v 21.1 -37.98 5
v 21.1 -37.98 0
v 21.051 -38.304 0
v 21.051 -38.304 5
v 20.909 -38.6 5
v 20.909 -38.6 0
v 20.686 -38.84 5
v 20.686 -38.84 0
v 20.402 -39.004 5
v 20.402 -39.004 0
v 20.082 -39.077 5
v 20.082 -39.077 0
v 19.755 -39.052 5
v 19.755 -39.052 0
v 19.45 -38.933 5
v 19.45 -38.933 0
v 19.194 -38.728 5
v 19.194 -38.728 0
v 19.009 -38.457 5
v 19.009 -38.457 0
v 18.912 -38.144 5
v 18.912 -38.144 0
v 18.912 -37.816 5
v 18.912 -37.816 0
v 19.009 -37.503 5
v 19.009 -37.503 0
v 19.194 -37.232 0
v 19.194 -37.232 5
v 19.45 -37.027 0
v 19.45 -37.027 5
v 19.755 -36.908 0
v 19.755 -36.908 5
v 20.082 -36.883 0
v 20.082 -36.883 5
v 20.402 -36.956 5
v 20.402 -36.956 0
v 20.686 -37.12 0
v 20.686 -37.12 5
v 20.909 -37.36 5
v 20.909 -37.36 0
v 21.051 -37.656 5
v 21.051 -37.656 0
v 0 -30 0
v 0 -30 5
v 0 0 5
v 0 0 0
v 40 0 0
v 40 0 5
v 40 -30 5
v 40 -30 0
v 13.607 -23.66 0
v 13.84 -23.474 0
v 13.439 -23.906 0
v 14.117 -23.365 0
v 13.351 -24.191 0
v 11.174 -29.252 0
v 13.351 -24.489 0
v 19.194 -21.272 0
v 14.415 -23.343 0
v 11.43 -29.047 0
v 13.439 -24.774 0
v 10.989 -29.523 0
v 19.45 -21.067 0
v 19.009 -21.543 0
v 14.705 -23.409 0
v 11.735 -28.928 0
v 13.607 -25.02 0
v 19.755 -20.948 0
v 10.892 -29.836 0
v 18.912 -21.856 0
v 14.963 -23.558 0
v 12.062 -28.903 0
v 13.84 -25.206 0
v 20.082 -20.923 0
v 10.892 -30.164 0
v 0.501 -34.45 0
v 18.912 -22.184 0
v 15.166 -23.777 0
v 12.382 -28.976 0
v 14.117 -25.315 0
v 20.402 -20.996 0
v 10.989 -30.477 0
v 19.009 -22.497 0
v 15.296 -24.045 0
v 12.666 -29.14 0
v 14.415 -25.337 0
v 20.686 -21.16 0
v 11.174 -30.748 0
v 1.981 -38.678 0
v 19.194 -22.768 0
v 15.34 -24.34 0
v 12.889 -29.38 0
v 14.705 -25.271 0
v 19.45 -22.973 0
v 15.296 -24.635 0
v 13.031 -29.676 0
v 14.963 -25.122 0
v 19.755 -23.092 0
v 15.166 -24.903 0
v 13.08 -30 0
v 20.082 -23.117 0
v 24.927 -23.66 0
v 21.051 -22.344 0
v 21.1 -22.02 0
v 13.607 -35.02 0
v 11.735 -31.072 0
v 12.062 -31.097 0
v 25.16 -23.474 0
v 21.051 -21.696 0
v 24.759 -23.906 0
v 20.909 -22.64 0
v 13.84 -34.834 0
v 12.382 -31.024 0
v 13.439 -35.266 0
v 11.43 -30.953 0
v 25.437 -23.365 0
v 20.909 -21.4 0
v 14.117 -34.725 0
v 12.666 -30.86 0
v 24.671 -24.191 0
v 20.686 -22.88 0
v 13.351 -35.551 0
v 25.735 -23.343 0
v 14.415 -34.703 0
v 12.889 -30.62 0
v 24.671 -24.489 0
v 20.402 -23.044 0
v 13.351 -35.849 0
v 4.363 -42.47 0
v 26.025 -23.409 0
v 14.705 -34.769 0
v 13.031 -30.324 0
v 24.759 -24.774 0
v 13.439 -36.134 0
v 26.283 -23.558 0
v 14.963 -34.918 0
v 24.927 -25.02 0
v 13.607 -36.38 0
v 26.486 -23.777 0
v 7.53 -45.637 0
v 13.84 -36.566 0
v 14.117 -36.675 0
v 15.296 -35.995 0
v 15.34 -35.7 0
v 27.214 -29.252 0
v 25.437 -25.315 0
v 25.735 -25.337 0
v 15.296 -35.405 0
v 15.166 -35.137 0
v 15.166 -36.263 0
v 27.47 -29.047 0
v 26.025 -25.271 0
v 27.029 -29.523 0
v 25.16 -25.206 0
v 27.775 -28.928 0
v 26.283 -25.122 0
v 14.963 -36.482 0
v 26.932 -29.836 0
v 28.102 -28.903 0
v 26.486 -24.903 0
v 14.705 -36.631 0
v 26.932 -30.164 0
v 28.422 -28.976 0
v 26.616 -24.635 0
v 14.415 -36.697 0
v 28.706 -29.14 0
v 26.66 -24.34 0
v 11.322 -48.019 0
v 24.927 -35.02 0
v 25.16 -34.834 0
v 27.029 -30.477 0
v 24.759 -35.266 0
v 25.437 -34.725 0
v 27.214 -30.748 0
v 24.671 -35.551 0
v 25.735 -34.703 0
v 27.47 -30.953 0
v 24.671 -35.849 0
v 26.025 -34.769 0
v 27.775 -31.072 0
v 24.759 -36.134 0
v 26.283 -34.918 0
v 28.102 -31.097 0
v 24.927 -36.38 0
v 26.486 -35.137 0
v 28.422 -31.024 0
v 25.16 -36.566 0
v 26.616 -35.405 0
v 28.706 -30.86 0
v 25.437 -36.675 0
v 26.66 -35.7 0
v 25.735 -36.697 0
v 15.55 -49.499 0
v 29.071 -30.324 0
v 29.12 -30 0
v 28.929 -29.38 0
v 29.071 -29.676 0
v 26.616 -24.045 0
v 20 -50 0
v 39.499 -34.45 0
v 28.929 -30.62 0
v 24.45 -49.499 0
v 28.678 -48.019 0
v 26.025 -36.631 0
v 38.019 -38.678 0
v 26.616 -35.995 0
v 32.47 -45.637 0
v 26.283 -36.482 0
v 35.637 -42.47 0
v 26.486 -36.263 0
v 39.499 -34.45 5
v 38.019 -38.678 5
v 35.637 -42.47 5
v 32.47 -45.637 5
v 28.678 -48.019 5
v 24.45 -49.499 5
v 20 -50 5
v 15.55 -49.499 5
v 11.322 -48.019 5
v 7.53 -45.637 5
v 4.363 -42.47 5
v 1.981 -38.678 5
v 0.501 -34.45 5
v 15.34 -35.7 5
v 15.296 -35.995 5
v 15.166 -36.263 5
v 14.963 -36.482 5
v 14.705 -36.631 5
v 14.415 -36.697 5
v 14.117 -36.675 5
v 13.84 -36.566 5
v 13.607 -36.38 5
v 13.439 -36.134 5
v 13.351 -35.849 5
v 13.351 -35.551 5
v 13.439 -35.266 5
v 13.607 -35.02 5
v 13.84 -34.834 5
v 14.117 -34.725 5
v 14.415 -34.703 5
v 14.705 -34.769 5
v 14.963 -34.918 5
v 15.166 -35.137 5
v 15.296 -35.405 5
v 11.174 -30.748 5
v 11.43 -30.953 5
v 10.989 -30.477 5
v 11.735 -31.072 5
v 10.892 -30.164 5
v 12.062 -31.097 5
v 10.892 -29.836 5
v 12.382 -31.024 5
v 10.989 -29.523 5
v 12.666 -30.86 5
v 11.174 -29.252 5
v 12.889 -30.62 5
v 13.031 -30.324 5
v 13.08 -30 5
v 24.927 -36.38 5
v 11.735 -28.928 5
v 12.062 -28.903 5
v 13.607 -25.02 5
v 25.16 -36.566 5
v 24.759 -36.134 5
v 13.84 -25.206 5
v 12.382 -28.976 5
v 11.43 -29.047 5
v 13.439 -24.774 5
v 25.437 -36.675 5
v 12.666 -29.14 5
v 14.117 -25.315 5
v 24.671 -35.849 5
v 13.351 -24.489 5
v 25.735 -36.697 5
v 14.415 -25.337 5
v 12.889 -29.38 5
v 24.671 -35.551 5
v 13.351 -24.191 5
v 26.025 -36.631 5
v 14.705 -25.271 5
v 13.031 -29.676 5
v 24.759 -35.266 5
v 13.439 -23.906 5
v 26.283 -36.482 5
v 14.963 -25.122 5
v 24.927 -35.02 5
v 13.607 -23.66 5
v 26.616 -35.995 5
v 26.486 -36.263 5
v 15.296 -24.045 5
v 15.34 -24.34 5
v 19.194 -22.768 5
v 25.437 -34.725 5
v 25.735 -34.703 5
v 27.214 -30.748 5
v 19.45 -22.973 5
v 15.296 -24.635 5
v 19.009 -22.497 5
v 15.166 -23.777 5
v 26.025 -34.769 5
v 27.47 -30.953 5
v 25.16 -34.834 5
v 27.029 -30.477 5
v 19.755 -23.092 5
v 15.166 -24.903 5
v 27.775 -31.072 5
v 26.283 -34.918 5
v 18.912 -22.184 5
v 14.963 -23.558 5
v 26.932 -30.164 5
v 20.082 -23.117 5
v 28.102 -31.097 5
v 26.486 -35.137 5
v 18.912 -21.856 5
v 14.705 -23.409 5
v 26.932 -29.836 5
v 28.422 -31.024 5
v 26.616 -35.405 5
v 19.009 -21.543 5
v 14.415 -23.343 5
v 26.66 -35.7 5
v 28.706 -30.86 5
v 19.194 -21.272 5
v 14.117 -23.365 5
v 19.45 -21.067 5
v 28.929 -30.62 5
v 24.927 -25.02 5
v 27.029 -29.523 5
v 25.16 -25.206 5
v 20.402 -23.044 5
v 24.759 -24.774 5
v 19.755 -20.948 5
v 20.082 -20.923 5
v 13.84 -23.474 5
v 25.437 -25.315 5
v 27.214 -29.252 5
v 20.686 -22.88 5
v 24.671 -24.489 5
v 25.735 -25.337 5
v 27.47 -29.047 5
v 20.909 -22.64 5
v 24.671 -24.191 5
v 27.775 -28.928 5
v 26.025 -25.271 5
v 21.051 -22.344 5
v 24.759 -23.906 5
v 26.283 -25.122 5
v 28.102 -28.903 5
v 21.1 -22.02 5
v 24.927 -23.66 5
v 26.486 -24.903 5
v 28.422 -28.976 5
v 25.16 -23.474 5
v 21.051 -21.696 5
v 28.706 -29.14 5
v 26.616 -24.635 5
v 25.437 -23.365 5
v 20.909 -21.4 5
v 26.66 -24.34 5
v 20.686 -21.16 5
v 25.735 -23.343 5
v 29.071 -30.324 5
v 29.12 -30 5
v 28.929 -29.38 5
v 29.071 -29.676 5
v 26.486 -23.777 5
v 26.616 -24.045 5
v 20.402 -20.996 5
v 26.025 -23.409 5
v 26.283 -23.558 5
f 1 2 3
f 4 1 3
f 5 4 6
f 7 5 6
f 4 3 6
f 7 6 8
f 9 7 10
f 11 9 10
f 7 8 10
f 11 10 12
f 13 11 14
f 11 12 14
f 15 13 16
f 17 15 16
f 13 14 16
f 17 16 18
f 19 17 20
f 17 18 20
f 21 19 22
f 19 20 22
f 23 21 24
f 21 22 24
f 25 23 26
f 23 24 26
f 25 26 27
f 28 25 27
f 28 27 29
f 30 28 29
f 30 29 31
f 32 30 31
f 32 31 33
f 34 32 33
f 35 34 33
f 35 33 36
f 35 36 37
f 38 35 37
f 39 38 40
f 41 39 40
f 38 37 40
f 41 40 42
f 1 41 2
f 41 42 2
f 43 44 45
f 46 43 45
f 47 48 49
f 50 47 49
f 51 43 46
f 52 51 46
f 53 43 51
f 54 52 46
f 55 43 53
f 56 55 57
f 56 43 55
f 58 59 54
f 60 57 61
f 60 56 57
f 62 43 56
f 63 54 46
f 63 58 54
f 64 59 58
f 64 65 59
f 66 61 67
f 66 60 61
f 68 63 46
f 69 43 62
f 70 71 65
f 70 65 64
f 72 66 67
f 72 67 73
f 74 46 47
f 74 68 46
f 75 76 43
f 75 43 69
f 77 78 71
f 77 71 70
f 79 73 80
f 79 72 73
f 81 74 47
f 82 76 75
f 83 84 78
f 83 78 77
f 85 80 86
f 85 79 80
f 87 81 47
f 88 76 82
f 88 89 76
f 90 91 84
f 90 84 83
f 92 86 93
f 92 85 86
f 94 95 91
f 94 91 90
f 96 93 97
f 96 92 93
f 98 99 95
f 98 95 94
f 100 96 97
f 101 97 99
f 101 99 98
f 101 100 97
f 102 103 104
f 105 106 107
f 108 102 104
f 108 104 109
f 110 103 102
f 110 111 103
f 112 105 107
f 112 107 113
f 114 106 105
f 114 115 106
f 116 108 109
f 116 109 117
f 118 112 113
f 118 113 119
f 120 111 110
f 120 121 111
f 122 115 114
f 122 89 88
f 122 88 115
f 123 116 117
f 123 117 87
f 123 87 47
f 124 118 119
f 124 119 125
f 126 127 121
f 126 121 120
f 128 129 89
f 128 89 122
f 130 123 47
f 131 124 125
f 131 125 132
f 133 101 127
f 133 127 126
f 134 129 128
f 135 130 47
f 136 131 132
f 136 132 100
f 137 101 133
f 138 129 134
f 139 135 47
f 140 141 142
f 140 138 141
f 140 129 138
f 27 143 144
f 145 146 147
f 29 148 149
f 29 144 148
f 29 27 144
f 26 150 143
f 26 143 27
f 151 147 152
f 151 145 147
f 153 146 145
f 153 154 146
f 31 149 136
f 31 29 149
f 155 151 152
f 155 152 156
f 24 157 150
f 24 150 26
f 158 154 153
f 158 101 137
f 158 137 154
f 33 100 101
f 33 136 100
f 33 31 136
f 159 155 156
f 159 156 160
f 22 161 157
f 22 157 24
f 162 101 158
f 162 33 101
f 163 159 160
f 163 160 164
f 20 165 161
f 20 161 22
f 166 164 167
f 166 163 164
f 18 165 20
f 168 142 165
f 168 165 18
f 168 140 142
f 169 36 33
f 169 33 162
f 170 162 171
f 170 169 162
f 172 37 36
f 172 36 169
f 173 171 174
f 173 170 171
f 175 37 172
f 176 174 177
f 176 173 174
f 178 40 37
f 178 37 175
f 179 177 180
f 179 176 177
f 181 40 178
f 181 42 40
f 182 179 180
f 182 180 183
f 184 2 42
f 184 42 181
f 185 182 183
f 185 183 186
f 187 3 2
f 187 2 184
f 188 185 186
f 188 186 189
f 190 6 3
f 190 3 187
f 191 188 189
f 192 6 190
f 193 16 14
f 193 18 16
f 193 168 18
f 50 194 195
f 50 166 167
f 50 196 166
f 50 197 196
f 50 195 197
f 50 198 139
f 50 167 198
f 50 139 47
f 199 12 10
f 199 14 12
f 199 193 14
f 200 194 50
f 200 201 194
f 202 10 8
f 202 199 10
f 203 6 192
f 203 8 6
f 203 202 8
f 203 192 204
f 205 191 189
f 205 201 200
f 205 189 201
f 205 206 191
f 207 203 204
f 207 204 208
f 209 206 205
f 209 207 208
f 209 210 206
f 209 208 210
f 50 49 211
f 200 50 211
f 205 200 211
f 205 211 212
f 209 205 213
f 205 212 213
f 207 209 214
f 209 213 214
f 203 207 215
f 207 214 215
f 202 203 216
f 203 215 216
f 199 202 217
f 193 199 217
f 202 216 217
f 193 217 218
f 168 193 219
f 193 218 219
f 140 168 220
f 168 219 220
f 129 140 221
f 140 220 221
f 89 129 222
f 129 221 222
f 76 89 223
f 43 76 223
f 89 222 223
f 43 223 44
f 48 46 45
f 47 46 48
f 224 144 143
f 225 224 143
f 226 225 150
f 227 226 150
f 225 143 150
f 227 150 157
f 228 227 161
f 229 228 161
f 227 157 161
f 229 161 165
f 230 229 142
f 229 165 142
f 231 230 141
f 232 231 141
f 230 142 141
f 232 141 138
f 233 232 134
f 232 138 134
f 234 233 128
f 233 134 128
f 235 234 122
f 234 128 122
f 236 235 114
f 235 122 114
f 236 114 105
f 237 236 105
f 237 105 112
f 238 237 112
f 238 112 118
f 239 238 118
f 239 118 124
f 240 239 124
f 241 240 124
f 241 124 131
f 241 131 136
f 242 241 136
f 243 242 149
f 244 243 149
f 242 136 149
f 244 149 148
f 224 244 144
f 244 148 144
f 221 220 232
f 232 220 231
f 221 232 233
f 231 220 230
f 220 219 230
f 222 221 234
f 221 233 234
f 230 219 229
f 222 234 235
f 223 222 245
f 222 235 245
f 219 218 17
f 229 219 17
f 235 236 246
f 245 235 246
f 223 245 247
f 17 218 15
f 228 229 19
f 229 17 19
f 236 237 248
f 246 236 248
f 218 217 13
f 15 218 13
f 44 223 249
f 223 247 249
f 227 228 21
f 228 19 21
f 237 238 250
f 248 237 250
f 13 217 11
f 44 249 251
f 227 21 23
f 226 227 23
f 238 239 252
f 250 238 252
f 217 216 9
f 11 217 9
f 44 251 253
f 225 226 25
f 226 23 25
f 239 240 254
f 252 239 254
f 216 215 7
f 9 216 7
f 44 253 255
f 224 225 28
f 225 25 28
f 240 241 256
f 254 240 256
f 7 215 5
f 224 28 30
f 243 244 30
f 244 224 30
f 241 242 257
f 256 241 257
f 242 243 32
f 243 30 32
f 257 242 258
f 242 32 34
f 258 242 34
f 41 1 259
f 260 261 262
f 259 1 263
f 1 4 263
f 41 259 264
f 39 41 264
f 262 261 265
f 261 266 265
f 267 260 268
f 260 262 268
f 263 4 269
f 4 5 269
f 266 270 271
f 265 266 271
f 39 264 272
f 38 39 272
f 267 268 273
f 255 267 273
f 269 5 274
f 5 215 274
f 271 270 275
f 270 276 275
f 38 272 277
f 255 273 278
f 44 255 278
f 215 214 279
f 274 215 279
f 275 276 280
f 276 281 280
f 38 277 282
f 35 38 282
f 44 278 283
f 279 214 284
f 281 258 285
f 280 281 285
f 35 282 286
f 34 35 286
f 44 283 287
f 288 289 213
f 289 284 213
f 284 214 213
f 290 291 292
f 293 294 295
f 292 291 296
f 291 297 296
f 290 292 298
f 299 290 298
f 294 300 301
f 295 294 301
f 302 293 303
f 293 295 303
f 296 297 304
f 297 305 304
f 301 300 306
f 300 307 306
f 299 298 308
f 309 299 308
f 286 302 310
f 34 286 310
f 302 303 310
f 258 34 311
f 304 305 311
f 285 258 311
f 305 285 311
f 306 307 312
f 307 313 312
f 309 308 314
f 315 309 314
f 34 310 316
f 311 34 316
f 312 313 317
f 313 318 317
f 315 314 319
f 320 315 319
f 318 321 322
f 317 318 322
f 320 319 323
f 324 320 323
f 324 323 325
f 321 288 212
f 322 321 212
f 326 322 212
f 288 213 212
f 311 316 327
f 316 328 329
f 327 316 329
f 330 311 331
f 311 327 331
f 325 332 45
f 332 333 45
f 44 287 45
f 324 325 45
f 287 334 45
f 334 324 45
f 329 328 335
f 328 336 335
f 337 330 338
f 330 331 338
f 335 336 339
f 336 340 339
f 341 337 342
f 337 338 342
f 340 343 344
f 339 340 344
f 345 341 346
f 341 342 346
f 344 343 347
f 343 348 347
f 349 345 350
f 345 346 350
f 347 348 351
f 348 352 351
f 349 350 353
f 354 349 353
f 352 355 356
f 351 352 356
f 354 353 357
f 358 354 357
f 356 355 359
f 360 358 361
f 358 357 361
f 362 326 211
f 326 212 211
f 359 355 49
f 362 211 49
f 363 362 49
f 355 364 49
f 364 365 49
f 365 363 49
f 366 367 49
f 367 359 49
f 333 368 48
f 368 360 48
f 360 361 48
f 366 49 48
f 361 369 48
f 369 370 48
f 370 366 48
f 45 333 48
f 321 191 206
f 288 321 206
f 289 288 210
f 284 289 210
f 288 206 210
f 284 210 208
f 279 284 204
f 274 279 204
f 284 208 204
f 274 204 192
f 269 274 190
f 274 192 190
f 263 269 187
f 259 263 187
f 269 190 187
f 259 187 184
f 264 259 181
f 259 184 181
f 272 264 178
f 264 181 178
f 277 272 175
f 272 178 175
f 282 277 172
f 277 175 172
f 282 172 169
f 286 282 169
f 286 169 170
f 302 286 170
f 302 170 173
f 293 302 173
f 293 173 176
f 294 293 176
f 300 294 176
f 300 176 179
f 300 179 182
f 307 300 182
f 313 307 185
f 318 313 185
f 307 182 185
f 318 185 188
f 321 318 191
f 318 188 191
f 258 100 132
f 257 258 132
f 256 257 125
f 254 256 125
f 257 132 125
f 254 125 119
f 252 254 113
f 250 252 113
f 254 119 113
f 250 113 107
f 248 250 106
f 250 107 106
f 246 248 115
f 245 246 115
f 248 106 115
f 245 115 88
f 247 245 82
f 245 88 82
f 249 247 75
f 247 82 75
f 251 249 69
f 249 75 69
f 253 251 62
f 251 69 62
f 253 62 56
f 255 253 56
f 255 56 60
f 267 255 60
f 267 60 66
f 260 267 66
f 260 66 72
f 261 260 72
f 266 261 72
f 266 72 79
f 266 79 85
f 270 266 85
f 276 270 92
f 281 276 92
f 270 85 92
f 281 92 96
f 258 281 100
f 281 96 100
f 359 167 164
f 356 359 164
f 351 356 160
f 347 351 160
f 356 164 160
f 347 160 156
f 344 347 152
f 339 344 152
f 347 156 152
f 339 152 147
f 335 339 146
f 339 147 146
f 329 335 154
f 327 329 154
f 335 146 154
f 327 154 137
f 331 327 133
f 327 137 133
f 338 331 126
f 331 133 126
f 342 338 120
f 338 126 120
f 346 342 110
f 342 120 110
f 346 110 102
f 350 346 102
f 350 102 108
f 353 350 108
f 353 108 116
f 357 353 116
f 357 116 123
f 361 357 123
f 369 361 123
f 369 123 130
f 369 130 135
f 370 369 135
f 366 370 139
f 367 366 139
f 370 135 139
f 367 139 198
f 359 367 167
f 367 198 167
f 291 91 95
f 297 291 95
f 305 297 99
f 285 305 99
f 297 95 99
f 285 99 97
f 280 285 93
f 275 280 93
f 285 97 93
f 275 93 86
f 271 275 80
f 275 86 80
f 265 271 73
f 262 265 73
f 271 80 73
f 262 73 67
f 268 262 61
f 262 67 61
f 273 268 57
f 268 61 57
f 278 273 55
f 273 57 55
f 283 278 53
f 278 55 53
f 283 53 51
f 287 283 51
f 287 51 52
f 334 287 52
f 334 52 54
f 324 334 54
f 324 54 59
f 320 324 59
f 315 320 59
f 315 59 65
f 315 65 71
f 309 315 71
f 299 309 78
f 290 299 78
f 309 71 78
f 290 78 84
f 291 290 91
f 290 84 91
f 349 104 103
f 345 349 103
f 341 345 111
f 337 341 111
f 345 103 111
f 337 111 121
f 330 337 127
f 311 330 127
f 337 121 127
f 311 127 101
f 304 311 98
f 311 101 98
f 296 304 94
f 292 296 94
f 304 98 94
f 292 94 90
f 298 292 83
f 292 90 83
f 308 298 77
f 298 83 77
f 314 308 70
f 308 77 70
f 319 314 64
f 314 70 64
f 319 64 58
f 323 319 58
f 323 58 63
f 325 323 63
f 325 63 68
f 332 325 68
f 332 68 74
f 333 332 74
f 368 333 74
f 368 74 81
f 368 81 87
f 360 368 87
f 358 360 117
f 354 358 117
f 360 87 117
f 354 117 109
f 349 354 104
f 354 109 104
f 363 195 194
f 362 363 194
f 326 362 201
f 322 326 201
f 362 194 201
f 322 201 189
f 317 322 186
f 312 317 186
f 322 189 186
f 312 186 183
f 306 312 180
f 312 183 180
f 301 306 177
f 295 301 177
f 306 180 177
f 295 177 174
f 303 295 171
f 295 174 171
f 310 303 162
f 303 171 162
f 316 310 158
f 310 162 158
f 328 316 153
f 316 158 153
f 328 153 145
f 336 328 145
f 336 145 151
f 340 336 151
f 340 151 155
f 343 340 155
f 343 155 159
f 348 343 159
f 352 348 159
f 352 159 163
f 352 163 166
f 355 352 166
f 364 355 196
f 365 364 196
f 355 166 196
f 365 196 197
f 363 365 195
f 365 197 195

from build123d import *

# Parameters (mm, degrees)
SKETCH_W        = 29
SKETCH_H        = 47
PAD_DEPTH       = 40
SKETCH001_R     = 9.75
PAD001_DEPTH    = 10
SKETCH002_W     = 56
SKETCH002_H     = 6
POCKET_DEPTH    = 100
SKETCH003_W     = 54.44
SKETCH003_H     = 5.76
POCKET001_DEPTH = 40.001
SKETCH004_R     = 1.1
SKETCH004_R_2   = 1
POCKET002_DEPTH = 5
SKETCH005_W     = 54.27
SKETCH005_H     = 70.91
POCKET003_DEPTH = 50.001


with BuildPart() as part:
    # Sketch → Pad (new body)
    with BuildSketch(Plane.XY.offset(10)):
        with BuildLine():
            Line((0, 0), (40, 0))
            Line((40, 0), (40, 60))
            ThreePointArc((40, 60), (20, 68.990653), (0, 60))
            Line((0, 60), (0, 0))
        make_face()
        with Locations((20, 30)):
            Rectangle(SKETCH_W, SKETCH_H, mode=Mode.SUBTRACT)
    extrude(amount=PAD_DEPTH)

    # Sketch001 (on Face9 of Pad) → Pad001 (join)
    with BuildSketch(Plane(origin=(0, 0, 10), x_dir=(1, 0, 0), z_dir=(0, 0, -1))):
        with BuildLine():
            Line((40, -60), (40, 30))
            ThreePointArc((40, 30), (20, 50), (0, 30))
            Line((0, 30), (0, -60))
            ThreePointArc((0, -60), (20, -68.990653), (40, -60))
        make_face()
        with Locations((20, -42.25)):
            Circle(SKETCH001_R, mode=Mode.SUBTRACT)
    extrude(amount=PAD001_DEPTH)

    # Sketch002 (on Face7 of Pad001) → Pocket (cut)
    with BuildSketch(Plane(origin=(0, 0, 0), x_dir=(0, -1, 0), z_dir=(-1, 0, 0))):
        with Locations((-48, 3)):
            Rectangle(SKETCH002_W, SKETCH002_H)
    extrude(amount=-POCKET_DEPTH, mode=Mode.SUBTRACT)

    # Sketch003 (on Face8 of Pocket) → Pocket001 (cut, through all)
    with BuildSketch(Plane.YZ.offset(40)):
        with Locations((-27.22, 7.88)):
            Rectangle(SKETCH003_W, SKETCH003_H)
    extrude(amount=-POCKET001_DEPTH, mode=Mode.SUBTRACT)

    # Sketch004 (on Face12 of Pocket001) → Pocket002 (cut)
    with BuildSketch(Plane(origin=(0, 0, 0), x_dir=(1, 0, 0), z_dir=(0, 0, -1))):
        with Locations((11.98, 30)):
            Circle(SKETCH004_R)
        with Locations((14.34, 35.7)):
            Circle(SKETCH004_R_2)
        with Locations((20, 37.98)):
            Circle(SKETCH004_R)
        with Locations((25.66, 35.7)):
            Circle(SKETCH004_R_2)
        with Locations((28.02, 30)):
            Circle(SKETCH004_R)
        with Locations((25.66, 24.34)):
            Circle(SKETCH004_R_2)
        with Locations((20, 22.02)):
            Circle(SKETCH004_R)
        with Locations((14.34, 24.34)):
            Circle(SKETCH004_R_2)
    extrude(amount=-POCKET002_DEPTH, mode=Mode.SUBTRACT)

    # Sketch005 (on Face12 of Pocket002) → Pocket003 (cut, through all)
    with BuildSketch(Plane(origin=(0, 0, 0), x_dir=(1, 0, 0), z_dir=(0, 0, -1))):
        with Locations((27.135, -35.455)):
            Rectangle(SKETCH005_W, SKETCH005_H)
    extrude(amount=-POCKET003_DEPTH, mode=Mode.SUBTRACT)


solid = part.part
